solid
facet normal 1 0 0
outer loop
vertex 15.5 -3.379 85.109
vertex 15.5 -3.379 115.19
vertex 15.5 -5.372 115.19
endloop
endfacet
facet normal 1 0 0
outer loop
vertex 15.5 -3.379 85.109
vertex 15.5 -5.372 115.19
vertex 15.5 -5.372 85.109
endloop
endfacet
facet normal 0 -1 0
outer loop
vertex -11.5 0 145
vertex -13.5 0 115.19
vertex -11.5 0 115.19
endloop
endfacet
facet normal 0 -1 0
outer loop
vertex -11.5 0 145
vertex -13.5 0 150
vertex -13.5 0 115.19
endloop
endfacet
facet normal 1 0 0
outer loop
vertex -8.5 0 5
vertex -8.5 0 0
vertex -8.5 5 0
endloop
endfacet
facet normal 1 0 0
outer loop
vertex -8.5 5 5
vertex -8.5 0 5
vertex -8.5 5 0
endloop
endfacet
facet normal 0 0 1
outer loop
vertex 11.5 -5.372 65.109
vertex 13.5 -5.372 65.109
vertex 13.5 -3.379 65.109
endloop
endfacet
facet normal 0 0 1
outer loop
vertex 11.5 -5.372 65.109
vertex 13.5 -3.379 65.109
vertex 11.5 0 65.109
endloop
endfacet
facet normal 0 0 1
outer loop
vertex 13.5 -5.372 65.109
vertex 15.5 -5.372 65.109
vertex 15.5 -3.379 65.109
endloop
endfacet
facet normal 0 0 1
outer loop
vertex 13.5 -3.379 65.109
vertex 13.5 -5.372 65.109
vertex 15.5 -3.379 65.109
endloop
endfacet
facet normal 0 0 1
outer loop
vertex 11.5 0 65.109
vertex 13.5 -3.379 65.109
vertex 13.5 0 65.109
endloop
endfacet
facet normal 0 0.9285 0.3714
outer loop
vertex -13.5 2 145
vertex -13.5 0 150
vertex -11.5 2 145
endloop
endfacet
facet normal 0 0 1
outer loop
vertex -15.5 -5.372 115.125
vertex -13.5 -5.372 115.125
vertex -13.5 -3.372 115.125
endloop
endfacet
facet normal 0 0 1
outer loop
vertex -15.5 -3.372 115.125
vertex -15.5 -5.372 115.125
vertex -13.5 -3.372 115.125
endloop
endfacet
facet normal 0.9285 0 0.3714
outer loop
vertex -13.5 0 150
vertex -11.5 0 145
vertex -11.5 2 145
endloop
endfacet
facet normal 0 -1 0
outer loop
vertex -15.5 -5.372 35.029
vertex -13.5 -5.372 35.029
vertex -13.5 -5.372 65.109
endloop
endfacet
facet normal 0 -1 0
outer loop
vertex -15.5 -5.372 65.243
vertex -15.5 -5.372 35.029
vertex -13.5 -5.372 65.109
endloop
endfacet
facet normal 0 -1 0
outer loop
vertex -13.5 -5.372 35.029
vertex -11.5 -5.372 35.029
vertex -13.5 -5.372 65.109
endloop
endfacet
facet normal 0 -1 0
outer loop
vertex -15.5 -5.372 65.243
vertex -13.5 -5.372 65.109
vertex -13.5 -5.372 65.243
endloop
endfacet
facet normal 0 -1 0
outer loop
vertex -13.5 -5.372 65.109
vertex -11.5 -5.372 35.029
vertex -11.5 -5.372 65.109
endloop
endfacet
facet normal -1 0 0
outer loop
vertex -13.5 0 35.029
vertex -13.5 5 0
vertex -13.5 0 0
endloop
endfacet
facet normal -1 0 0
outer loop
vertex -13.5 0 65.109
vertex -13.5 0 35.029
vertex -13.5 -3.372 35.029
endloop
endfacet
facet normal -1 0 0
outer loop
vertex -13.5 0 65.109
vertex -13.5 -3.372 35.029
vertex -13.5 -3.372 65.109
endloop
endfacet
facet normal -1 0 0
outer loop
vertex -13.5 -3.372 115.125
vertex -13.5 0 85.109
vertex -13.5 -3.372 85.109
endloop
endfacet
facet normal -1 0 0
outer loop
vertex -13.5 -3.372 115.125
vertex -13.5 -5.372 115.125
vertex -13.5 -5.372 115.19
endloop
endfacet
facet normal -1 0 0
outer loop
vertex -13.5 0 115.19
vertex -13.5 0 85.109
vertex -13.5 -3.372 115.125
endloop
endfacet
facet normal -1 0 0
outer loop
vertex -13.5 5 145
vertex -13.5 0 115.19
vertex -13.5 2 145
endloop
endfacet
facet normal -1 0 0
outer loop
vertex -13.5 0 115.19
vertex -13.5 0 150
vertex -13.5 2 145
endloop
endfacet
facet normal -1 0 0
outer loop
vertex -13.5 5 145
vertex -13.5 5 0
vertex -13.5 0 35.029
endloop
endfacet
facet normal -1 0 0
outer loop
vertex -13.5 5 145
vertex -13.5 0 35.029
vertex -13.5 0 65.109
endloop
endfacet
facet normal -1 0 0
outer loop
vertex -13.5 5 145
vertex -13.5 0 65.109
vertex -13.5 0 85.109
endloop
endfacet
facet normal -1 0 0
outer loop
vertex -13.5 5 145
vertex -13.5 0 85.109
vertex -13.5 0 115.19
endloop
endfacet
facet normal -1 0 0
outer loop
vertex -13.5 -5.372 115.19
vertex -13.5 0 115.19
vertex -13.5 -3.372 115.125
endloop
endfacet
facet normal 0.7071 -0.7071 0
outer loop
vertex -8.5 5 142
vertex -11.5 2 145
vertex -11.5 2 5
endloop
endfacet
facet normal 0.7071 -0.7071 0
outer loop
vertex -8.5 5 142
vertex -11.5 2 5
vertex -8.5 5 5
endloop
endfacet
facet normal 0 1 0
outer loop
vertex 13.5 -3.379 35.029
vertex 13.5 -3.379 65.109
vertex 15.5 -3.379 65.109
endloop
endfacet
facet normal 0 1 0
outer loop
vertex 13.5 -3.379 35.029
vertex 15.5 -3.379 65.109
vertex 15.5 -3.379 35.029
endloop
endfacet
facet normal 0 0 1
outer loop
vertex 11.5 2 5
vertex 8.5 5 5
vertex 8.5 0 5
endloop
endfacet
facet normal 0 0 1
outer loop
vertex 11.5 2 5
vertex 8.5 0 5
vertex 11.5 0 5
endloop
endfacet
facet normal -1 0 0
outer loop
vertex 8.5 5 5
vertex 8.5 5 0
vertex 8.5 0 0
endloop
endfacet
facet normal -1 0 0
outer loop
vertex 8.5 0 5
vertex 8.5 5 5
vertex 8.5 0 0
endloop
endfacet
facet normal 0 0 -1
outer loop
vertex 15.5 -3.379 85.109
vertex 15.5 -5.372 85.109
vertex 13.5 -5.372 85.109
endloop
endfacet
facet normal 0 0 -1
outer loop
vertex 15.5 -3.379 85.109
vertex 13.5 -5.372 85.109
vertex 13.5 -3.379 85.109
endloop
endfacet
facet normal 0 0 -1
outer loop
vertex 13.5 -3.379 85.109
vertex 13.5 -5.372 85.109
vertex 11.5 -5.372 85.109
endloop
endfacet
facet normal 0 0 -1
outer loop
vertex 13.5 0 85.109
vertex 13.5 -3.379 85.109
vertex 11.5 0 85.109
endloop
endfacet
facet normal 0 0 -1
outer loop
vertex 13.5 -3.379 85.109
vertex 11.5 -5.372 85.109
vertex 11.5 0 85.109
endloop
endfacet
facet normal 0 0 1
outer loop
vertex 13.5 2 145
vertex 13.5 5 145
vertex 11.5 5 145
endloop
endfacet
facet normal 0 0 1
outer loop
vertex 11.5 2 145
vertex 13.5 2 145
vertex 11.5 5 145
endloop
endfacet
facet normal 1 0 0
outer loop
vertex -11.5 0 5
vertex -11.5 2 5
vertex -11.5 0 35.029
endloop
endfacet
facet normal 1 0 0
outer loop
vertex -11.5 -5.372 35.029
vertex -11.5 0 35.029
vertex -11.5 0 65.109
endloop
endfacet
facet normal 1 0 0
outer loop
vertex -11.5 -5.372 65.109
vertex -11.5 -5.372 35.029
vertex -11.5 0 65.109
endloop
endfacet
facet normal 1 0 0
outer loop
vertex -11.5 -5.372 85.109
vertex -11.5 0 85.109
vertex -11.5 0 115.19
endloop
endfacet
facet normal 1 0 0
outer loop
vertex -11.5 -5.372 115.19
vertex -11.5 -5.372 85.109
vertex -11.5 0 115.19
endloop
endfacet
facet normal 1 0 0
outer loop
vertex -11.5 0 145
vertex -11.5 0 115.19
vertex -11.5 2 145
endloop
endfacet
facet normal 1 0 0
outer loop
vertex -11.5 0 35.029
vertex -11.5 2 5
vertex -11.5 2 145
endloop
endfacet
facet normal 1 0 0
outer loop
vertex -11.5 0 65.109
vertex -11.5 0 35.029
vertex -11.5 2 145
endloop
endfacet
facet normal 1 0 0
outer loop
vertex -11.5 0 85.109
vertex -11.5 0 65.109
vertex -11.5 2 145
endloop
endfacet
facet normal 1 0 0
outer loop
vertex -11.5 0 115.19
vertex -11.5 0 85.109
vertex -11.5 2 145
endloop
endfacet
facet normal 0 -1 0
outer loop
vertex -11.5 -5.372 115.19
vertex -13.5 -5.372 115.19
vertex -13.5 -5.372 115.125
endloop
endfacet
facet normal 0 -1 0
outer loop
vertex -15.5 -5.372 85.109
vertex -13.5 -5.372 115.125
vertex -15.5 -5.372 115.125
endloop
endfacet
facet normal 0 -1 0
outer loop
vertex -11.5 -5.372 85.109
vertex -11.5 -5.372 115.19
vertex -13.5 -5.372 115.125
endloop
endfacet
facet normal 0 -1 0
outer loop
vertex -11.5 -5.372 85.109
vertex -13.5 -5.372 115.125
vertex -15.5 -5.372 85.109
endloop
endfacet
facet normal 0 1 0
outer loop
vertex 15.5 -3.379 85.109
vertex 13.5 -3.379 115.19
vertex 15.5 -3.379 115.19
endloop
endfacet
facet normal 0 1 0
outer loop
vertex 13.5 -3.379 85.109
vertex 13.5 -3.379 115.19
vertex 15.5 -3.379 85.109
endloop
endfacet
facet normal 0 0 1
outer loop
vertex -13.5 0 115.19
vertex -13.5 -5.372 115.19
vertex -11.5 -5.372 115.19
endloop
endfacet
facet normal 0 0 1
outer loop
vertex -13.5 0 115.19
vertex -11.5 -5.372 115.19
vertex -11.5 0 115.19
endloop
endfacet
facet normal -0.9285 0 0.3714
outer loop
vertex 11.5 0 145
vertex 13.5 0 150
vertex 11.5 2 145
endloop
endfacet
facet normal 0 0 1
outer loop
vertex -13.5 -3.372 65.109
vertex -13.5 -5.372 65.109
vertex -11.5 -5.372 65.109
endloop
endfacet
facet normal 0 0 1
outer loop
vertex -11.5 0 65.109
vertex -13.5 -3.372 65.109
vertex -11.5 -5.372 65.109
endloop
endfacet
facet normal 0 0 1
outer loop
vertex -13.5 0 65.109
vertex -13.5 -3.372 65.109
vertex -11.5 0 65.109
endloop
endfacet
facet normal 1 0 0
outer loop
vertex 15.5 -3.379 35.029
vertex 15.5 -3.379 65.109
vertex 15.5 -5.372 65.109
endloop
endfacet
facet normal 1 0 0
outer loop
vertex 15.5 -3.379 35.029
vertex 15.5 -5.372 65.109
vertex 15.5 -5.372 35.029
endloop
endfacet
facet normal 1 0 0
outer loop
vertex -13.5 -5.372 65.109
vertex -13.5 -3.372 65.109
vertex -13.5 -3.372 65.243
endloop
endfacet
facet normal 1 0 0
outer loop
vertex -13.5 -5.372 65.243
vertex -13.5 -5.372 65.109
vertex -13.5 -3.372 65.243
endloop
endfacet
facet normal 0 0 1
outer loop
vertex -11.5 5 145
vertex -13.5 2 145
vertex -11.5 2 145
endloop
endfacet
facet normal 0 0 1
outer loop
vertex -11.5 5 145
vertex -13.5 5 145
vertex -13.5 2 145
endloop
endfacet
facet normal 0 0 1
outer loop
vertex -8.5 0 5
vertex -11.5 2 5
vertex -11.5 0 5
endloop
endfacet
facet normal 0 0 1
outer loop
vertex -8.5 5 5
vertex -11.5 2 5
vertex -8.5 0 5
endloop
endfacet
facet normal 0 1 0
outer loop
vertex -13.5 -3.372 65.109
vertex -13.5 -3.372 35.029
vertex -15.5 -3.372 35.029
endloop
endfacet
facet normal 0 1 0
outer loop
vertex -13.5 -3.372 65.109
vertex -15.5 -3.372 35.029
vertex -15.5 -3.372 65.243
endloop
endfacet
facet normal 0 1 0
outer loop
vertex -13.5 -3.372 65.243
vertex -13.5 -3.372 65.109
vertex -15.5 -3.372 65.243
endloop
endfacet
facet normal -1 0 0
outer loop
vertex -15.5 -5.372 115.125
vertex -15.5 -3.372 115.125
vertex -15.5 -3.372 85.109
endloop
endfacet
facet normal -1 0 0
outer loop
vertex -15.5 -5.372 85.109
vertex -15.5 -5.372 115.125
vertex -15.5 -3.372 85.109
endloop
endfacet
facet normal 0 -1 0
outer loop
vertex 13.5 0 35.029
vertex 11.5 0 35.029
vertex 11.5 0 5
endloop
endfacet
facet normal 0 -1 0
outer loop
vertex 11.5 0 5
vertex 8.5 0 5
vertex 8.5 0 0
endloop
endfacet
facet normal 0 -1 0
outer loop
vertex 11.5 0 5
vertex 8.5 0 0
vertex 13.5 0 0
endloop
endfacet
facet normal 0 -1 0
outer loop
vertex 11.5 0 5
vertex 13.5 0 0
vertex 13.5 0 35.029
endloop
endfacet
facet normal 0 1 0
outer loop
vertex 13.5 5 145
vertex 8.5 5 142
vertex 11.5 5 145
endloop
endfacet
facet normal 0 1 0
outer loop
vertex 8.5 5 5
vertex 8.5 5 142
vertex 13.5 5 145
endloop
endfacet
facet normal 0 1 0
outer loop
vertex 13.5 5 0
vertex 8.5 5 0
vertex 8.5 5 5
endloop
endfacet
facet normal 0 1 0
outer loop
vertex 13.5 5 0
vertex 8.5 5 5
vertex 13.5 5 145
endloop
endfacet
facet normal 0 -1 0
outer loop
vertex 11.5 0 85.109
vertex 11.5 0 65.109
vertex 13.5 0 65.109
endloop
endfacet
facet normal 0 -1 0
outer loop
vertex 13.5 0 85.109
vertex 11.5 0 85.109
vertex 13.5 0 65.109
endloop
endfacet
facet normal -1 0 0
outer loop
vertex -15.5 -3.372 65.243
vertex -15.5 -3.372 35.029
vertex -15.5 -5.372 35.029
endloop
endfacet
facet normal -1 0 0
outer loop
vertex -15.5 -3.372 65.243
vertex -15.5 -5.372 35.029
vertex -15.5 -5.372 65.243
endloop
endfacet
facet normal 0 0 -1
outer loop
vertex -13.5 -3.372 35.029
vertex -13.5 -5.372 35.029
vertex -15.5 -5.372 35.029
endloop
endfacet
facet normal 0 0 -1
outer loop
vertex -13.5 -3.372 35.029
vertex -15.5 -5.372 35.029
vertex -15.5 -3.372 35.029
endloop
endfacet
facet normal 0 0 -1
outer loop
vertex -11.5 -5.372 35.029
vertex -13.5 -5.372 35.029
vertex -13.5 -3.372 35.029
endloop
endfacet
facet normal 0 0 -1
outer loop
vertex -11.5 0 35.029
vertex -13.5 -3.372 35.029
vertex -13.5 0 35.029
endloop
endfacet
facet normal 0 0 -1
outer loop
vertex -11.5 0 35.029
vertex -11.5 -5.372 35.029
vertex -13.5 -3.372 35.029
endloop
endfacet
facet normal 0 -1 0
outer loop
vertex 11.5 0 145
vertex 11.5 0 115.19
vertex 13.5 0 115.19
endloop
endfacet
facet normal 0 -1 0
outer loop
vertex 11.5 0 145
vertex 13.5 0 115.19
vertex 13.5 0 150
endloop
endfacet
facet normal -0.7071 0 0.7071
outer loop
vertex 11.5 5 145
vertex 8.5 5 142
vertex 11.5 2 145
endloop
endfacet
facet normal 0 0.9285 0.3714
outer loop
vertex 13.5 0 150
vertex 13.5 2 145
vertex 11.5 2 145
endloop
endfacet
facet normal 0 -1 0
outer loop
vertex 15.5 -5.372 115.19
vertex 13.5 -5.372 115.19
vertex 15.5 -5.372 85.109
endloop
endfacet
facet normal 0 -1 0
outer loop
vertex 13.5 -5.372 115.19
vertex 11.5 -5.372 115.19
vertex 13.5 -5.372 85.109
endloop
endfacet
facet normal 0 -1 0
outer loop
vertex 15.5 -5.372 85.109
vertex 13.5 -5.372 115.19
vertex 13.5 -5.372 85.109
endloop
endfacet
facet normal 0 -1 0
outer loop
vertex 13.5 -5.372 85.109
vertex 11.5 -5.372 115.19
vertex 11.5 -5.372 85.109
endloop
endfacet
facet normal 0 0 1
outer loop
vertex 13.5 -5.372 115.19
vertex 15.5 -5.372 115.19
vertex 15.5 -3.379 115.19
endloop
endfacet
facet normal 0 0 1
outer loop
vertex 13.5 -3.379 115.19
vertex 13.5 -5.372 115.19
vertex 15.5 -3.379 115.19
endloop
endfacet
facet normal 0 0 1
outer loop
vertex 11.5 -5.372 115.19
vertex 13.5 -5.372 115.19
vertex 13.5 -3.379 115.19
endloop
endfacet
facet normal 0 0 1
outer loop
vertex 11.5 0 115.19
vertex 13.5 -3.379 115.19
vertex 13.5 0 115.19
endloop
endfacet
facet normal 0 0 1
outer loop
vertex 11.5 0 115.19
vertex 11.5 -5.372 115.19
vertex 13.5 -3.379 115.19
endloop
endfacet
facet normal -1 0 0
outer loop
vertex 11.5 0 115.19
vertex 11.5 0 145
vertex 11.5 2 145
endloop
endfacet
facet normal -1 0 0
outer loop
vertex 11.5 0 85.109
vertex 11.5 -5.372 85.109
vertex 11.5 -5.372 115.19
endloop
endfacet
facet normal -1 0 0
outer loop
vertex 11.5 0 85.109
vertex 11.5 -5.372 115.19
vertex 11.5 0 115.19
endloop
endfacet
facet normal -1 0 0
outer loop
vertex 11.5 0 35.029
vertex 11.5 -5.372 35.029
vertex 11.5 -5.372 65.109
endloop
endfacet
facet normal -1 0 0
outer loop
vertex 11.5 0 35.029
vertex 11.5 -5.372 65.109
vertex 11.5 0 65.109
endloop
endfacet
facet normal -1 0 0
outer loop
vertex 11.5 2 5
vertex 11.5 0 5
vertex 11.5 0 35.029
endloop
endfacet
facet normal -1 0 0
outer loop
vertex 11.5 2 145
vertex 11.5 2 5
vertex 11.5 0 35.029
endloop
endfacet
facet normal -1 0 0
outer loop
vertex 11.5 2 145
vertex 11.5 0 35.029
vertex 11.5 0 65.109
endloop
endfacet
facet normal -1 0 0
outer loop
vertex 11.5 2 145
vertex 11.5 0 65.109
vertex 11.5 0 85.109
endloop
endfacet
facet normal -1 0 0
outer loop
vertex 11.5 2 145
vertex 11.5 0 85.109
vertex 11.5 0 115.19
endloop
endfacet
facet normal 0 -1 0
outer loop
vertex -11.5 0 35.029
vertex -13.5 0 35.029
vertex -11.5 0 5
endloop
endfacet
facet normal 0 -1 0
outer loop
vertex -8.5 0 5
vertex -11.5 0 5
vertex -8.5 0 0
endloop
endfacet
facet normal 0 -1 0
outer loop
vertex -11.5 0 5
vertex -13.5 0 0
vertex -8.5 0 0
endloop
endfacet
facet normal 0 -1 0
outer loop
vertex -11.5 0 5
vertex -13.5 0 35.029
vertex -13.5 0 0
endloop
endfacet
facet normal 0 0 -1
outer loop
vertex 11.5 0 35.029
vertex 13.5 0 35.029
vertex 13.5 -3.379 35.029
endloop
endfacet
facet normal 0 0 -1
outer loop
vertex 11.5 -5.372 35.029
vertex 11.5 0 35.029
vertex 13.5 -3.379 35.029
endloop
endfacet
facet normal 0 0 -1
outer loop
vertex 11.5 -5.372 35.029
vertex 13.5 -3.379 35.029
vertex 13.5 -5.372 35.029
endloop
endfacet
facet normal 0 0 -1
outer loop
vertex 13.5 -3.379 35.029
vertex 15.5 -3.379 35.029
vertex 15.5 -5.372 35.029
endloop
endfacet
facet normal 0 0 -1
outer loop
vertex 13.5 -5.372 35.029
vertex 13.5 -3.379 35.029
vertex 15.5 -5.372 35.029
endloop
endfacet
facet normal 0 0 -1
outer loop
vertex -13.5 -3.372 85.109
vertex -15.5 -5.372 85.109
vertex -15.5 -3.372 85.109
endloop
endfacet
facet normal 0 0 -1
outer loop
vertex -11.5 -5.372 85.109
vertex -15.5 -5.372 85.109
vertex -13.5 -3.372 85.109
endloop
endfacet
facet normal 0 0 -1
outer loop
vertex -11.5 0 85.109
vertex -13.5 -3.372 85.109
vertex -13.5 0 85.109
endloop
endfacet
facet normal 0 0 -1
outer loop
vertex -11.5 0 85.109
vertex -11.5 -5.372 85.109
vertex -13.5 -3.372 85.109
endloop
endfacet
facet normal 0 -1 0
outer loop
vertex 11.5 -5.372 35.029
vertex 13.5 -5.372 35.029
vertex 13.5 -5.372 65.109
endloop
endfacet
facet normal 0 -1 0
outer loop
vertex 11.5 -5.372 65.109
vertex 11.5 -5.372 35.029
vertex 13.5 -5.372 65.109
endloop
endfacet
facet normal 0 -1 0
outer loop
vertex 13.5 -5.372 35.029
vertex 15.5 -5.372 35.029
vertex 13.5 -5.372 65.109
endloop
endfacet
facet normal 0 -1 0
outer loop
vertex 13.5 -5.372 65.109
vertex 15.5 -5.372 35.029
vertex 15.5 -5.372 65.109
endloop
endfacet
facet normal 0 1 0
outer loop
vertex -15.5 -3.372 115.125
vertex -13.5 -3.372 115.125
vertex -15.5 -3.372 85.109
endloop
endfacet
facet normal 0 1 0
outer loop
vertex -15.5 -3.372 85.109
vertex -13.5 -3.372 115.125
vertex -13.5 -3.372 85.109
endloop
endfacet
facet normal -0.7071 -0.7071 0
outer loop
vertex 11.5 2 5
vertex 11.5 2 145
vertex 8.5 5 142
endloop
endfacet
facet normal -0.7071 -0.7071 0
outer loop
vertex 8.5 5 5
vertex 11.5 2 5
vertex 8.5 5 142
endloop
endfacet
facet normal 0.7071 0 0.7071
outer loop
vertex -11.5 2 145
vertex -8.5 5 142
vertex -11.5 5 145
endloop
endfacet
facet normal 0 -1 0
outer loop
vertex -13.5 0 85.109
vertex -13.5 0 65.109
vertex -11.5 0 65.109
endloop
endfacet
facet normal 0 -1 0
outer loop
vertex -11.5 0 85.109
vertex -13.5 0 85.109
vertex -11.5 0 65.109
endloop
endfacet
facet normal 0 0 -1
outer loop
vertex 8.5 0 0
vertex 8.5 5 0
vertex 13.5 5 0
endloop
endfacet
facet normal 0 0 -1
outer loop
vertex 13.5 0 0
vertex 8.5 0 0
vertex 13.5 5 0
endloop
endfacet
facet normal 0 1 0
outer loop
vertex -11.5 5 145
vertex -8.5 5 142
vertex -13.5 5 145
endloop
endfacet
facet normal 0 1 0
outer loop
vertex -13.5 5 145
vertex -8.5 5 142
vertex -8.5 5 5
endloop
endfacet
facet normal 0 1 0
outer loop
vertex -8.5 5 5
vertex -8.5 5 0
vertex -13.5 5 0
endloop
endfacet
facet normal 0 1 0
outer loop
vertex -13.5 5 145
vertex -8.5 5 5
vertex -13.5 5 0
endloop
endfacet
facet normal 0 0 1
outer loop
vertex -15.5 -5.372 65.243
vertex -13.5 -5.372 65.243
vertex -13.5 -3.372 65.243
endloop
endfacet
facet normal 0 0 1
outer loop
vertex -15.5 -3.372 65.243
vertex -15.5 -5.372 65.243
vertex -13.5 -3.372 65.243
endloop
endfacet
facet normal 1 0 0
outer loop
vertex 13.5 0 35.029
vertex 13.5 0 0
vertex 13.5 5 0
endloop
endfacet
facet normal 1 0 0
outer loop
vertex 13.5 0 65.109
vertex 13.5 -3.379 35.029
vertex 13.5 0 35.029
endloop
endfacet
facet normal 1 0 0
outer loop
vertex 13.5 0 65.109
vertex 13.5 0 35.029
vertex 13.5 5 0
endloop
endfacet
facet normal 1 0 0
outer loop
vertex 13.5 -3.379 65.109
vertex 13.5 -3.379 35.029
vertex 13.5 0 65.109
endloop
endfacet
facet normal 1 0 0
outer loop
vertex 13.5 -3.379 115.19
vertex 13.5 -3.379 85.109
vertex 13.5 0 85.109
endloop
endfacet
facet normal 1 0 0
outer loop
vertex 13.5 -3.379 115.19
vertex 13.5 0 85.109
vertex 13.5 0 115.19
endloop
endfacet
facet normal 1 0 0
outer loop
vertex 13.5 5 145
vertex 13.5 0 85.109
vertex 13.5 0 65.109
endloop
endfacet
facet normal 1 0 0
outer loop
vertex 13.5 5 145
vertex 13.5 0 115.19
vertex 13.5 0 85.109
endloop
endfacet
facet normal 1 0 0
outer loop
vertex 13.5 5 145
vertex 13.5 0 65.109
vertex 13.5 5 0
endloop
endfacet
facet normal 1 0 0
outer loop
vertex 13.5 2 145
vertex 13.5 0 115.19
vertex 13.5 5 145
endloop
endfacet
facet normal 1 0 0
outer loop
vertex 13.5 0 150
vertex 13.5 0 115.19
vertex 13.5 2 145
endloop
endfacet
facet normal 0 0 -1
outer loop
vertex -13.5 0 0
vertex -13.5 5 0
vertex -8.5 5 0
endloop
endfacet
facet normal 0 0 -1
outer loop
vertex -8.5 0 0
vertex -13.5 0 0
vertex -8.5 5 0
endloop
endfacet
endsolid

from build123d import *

# Parameters (mm, degrees)
BOSS_EXTRUDE1_DEPTH   = 145
BOSS_EXTRUDE1_2_DEPTH = 145
CUT_EXTRUDE1_DEPTH    = 3
BOSS_EXTRUDE2_DEPTH   = 2
CUT_EXTRUDE2_DEPTH    = 2
BOSS_EXTRUDE3_DEPTH   = 5
CUT_EXTRUDE3_DEPTH    = 3
BOSS_EXTRUDE4_DEPTH   = 2
CUT_EXTRUDE4_DEPTH    = 2
BOSS_EXTRUDE5_DEPTH   = 5
SKETCH12_W            = 30.080177601
SKETCH12_H            = 5.371702136
SKETCH12_W_2          = 30.0801776
BOSS_EXTRUDE6_DEPTH   = 2
SKETCH13_W            = 30.015649286
SKETCH13_H            = 2
BOSS_EXTRUDE7_DEPTH   = 2
SKETCH15_W            = 30.0801776
SKETCH15_H            = 3.371702136
SKETCH15_H_2          = 2
SKETCH15_W_2          = 30.080177601
BOSS_EXTRUDE10_DEPTH  = 2
SKETCH16_W            = 30.0801776
SKETCH16_H            = 1.992652885
SKETCH16_W_2          = 30.080177601
BOSS_EXTRUDE11_DEPTH  = 2
SKETCH17_W            = 30.214135347
SKETCH17_H            = 2
BOSS_EXTRUDE12_DEPTH  = 2


with BuildPart() as part:
    # Sketch2 → Boss-Extrude1 (new body)
    with BuildSketch(Plane.XY):
        Polygon((-11.5, 2), (-8.5, 5), (-13.5, 5), (-13.5, 0), (-11.5, 0), align=None)
    extrude(amount=BOSS_EXTRUDE1_DEPTH)

    # Sketch4 → Cut-Extrude1 (cut)
    with BuildSketch(Plane(origin=(0, 5, 0), x_dir=(1, 0, 0), z_dir=(0, 1, 0))):
        Polygon((-8.5, -145), (-8.5, -142), (-11.5, -145), align=None)
    extrude(amount=-CUT_EXTRUDE1_DEPTH, mode=Mode.SUBTRACT)

    # Sketch5 → Boss-Extrude2 (add)
    with BuildSketch(Plane(origin=(-11.5, 0, 0), x_dir=(0, 0, -1), z_dir=(1, 0, 0))):
        Polygon((-145, 0), (-150, 0), (-145, 2), align=None)
    extrude(amount=-BOSS_EXTRUDE2_DEPTH)

    # Sketch6 → Cut-Extrude2 (cut)
    with BuildSketch(Plane.XZ):
        Polygon((-13.5, 150), (-11.5, 150), (-11.5, 145), align=None)
    extrude(amount=-CUT_EXTRUDE2_DEPTH, mode=Mode.SUBTRACT)

    # Sketch7 → Boss-Extrude3 (add)
    with BuildSketch(Plane(origin=(0, 0, 0), x_dir=(-1, 0, 0), z_dir=(0, 0, -1))):
        Polygon((8.5, 5), (11.5, 2), (11.5, 0), (8.5, 0), align=None)
    extrude(amount=-BOSS_EXTRUDE3_DEPTH)

    # Sketch12 → Boss-Extrude6 (add)
    with BuildSketch(Plane(origin=(-13.5, 0, 0), x_dir=(0, 0, -1), z_dir=(1, 0, 0))):
        with Locations((-50.069244291, -2.685851068)):
            Rectangle(SKETCH12_W, SKETCH12_H)
        with Locations((-100.149421892, -2.685851068)):
            Rectangle(SKETCH12_W_2, SKETCH12_H)
    extrude(amount=BOSS_EXTRUDE6_DEPTH)

    # Sketch13 → Boss-Extrude7 (add)
    with BuildSketch(Plane(origin=(-13.5, 0, 0), x_dir=(0, 0, -1), z_dir=(1, 0, 0))):
        with Locations((-100.117157735, -4.371702136)):
            Rectangle(SKETCH13_W, SKETCH13_H)
    extrude(amount=-BOSS_EXTRUDE7_DEPTH)

    # Sketch17 → Boss-Extrude12 (add)
    with BuildSketch(Plane.ZY.offset(13.5)):
        with Locations((50.136223165, -4.371702136)):
            Rectangle(SKETCH17_W, SKETCH17_H)
    extrude(amount=BOSS_EXTRUDE12_DEPTH)


with BuildPart() as body_2:
    # Sketch2 → Boss-Extrude1 2 (new body)
    with BuildSketch(Plane.XY):
        Polygon((11.5, 0), (11.5, 2), (8.5, 5), (13.5, 5), (13.5, 0), align=None)
    extrude(amount=BOSS_EXTRUDE1_2_DEPTH)

    # Sketch8 → Cut-Extrude3 (cut)
    with BuildSketch(Plane(origin=(0, 5, 0), x_dir=(1, 0, 0), z_dir=(0, 1, 0))):
        Polygon((8.5, -145), (8.5, -142), (11.5, -145), align=None)
    extrude(amount=-CUT_EXTRUDE3_DEPTH, mode=Mode.SUBTRACT)

    # Sketch9 → Boss-Extrude4 (add)
    with BuildSketch(Plane.XZ):
        Polygon((13.5, 145), (13.5, 150), (11.5, 145), align=None)
    extrude(amount=-BOSS_EXTRUDE4_DEPTH)

    # Sketch10 → Cut-Extrude4 (cut)
    with BuildSketch(Plane(origin=(13.5, 0, 0), x_dir=(0, 0, -1), z_dir=(1, 0, 0))):
        Polygon((-150, 2), (-145, 2), (-150, 0), align=None)
    extrude(amount=-CUT_EXTRUDE4_DEPTH, mode=Mode.SUBTRACT)

    # Sketch11 → Boss-Extrude5 (add)
    with BuildSketch(Plane(origin=(0, 0, 0), x_dir=(-1, 0, 0), z_dir=(0, 0, -1))):
        Polygon((-8.5, 5), (-8.5, 0), (-11.5, 0), (-11.5, 2), align=None)
    extrude(amount=-BOSS_EXTRUDE5_DEPTH)

    # Sketch15 → Boss-Extrude10 (add)
    with BuildSketch(Plane.ZY.offset(-13.5)):
        with Locations((100.149421892, -1.685851068)):
            Rectangle(SKETCH15_W, SKETCH15_H)
        with Locations((100.149421892, -4.371702136)):
            Rectangle(SKETCH15_W, SKETCH15_H_2)
        with Locations((50.069244291, -1.685851068)):
            Rectangle(SKETCH15_W_2, SKETCH15_H)
        with Locations((50.069244291, -4.371702136)):
            Rectangle(SKETCH15_W_2, SKETCH15_H_2)
    extrude(amount=BOSS_EXTRUDE10_DEPTH)

    # Sketch16 → Boss-Extrude11 (add)
    with BuildSketch(Plane(origin=(13.5, 0, 0), x_dir=(0, 0, -1), z_dir=(1, 0, 0))):
        with Locations((-100.149421892, -4.375375694)):
            Rectangle(SKETCH16_W, SKETCH16_H)
        with Locations((-50.069244291, -4.375375694)):
            Rectangle(SKETCH16_W_2, SKETCH16_H)
    extrude(amount=BOSS_EXTRUDE11_DEPTH)


solid = Compound([part.part, body_2.part])
